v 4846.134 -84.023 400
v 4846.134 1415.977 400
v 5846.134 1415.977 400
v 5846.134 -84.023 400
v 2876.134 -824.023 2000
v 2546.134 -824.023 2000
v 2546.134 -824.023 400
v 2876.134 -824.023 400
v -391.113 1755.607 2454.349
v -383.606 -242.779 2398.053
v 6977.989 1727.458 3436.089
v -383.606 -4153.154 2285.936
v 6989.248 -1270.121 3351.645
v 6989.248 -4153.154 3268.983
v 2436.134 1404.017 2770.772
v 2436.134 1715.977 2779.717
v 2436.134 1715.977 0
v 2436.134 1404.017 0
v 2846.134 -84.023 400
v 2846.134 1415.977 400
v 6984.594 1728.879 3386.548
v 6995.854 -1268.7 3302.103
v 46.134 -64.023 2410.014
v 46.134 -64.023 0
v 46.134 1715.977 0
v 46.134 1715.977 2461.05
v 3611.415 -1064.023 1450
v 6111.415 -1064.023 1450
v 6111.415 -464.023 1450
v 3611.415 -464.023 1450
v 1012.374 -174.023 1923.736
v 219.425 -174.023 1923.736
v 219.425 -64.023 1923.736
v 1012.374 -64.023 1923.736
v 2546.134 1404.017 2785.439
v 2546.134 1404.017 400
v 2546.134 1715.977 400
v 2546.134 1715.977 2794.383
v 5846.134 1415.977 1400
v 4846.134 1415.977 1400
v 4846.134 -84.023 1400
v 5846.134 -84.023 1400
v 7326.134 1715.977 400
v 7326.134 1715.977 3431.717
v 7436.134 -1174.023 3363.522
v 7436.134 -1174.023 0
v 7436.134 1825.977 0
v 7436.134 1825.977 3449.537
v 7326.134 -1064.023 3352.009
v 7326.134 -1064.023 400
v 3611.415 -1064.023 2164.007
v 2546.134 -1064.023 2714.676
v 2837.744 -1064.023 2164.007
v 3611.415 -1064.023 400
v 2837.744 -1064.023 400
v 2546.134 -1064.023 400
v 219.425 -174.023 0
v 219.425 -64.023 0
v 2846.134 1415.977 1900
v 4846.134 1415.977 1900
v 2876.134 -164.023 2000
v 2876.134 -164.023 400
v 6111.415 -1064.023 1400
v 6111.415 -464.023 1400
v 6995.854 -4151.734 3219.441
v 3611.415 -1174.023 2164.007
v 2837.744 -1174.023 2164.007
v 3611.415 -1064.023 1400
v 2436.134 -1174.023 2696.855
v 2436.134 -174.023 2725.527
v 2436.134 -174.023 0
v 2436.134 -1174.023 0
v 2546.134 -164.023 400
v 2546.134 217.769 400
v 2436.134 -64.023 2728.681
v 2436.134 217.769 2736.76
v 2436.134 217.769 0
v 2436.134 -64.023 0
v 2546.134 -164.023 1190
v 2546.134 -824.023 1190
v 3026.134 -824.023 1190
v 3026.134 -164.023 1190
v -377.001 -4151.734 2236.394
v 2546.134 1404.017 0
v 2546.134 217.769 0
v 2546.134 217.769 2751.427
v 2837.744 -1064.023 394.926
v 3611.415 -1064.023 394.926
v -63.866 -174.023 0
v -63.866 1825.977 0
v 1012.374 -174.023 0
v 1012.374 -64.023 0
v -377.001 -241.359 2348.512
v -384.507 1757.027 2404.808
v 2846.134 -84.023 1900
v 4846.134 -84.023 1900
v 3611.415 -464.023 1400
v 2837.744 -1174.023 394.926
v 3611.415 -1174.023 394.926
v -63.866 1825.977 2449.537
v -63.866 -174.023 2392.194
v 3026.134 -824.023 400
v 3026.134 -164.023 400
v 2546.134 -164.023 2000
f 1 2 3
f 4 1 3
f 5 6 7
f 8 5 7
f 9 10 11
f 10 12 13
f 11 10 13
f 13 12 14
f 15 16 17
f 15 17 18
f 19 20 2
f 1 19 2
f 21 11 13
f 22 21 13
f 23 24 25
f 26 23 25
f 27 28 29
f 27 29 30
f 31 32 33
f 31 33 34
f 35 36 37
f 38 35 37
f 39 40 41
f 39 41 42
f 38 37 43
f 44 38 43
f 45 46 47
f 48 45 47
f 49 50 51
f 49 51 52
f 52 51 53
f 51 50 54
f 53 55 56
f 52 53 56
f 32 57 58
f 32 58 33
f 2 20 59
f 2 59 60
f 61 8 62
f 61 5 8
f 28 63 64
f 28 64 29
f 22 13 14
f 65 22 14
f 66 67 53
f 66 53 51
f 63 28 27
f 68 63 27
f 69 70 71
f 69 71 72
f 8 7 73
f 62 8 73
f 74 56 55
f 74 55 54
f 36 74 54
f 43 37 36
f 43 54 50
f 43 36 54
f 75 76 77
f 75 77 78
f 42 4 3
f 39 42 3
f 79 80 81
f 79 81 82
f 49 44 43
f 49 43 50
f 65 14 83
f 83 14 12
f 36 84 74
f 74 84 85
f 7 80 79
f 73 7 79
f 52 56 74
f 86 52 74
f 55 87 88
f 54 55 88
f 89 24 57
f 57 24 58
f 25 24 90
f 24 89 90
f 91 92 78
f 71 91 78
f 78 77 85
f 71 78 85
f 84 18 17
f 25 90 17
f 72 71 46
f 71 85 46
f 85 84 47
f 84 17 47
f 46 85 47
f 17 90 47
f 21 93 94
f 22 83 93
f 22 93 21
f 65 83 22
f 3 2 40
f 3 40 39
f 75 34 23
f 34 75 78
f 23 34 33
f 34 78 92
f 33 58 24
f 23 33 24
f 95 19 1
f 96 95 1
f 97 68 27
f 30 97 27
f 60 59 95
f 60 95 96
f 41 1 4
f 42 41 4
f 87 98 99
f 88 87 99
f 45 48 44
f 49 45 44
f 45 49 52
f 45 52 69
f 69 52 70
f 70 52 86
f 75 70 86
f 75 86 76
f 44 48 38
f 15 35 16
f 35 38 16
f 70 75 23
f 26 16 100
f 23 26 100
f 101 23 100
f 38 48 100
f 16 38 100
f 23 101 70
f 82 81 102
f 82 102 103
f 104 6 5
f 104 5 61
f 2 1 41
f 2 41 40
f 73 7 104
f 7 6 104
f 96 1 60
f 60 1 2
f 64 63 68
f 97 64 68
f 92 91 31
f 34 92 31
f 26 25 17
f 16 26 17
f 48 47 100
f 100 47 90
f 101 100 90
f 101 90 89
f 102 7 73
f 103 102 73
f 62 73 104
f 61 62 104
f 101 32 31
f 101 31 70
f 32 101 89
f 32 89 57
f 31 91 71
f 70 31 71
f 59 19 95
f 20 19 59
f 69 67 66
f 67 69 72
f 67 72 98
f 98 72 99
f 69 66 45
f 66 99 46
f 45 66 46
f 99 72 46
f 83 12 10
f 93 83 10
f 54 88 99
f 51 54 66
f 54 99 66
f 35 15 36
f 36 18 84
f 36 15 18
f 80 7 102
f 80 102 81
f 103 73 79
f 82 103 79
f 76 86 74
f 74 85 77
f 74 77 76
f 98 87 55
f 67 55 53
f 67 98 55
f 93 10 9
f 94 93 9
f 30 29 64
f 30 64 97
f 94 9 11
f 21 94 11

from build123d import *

# Parameters (mm, degrees)
F7_DEPTH  = 50
F8_REACH  = 9267.0421515008
F9_W      = 792.9490208626
F9_H      = 1923.7364530563
F10_DEPTH = 110
F11_W     = 773.6711502075
F11_H     = 1769.0812349319
F12_DEPTH = 110
F13_DEPTH = 400
F14_W     = 660
F14_H     = 790
F15_DEPTH = 480
F14_H_2   = 810
F16_DEPTH = 330
F17_W     = 2000
F17_H     = 1500
F18_DEPTH = 1500
F17_W_2   = 1000
F19_DEPTH = 1000
F20_W     = 2500
F20_H     = 50
F21_DEPTH = 600


# Not quite as in the source:
# - a feature names something its author has since deleted; it is built from what else it names


with BuildPart() as f7:
    # F6 (on 3pt) → F7 (new body)
    with BuildSketch(Plane(origin=(-321.5081857629, -69.1366251757, 2411.3113932214), x_dir=(0.9912350116, -0.0037862856, 0.1320561086), z_dir=(0.1321103773, 0.0284088121, -0.9908278295))):
        Polygon((-62.647297173, 173.9513684009), (-70.2198684375, -1825.2270662935), (2407.8676605606, -1825.2270662935), (7364.0427185569, -1825.2270662935), (7375.4015754536, 1173.5405857481), (7375.4015754536, 4057.758942678), (-62.647297173, 4085.9330937089), align=None)
    extrude(amount=F7_DEPTH)


with BuildPart() as f8:
    f8_end = Plane(origin=(3304.4233440469, -1204.757655027, 2811.745783625), x_dir=(-0.9912279007, 0, -0.1321637201), z_dir=(0.1321103773, 0.0284088121, -0.9908278295))
    # F0 (on Top) → F8 (new body, up to a plane its end follows)
    with BuildSketch(Plane.XY):
        Polygon((7436.1340180039, 1825.9771460295), (2436.1340180039, 1825.9771460295), (2436.1340180039, 1715.9771460295), (2436.1340180039, 1404.0166139603), (2546.1340180039, 1404.0166139603), (2546.1340180039, 1715.9771460295), (7326.1340180039, 1715.9771460295), (7326.1340180039, -1064.0228539705), (2546.1340180039, -1064.0228539705), (2546.1340180039, 217.7686989307), (2436.1340180039, 217.7686989307), (2436.1340180039, -64.0228539705), (2436.1340180039, -174.0228539705), (2436.1340180039, -1174.0228539705), (7436.1340180039, -1174.0228539705), align=None)
        Polygon((2436.1340180039, 1825.9771460295), (-63.8659819961, 1825.9771460295), (-63.8659819961, -174.0228539705), (2436.1340180039, -174.0228539705), (2436.1340180039, -64.0228539705), (46.1340180039, -64.0228539705), (46.1340180039, 1715.9771460295), (2436.1340180039, 1715.9771460295), align=None)
    f8_long = extrude(amount=F8_REACH, mode=Mode.PRIVATE)
    add(split(f8_long, bisect_by=f8_end, keep=Keep.TOP, mode=Mode.PRIVATE))

    # F9 (on face) → F10 (cut, through all)
    with BuildSketch(Plane.XZ.offset(174.0228539705)):
        with Locations((615.8994138241, 961.8682265282)):
            Rectangle(F9_W, F9_H)
    extrude(amount=-F10_DEPTH, mode=Mode.SUBTRACT)

    # F11 (on face) → F12 (cut, through all)
    with BuildSketch(Plane.XZ.offset(1174.0228539705)):
        with Locations((3224.5798110962, 1279.4668078423)):
            Rectangle(F11_W, F11_H)
    extrude(amount=-F12_DEPTH, mode=Mode.SUBTRACT)

    # F0 (on Top) → F13 (join)
    with BuildSketch(Plane.XY):
        Polygon((2546.1340180039, 1715.9771460295), (2546.1340180039, 1404.0166139603), (2546.1340180039, 217.7686989307), (2546.1340180039, -1064.0228539705), (7326.1340180039, -1064.0228539705), (7326.1340180039, 1715.9771460295), align=None)
    extrude(amount=F13_DEPTH)


with BuildPart() as f15:
    # F14 (on face) → F15 (new body)
    with BuildSketch(Plane.YZ.offset(2546.1340180039)):
        with Locations((-494.0228539705, 795)):
            Rectangle(F14_W, F14_H)
    extrude(amount=F15_DEPTH)


with BuildPart() as f16:
    # F14 (on face) → F16 (new body)
    with BuildSketch(Plane.YZ.offset(2546.1340180039)):
        with Locations((-494.0228539705, 795)):
            Rectangle(F14_W, F14_H)
        with Locations((-494.0228539705, 1595)):
            Rectangle(F14_W, F14_H_2)
    extrude(amount=F16_DEPTH)


with BuildPart() as f18:
    # F17 (on face) → F18 (new body)
    with BuildSketch(Plane.XY.offset(400)):
        with Locations((3846.1340180039, 665.9771460295)):
            Rectangle(F17_W, F17_H)
    extrude(amount=F18_DEPTH)


with BuildPart() as f19:
    # F17 (on face) → F19 (new body)
    with BuildSketch(Plane.XY.offset(400)):
        with Locations((5346.1340180039, 665.9771460295)):
            Rectangle(F17_W_2, F17_H)
    extrude(amount=F19_DEPTH)


with BuildPart() as f21:
    # F20 (on face) → F21 (new body)
    with BuildSketch(Plane(origin=(0, -1064.0228539705, 0), x_dir=(-1, 0, 0), z_dir=(0, 1, 0))):
        with Locations((-4861.4153862, 1425)):
            Rectangle(F20_W, F20_H)
    extrude(amount=F21_DEPTH)


solid = Compound([f7.part, f8.part, f15.part, f16.part, f18.part, f19.part, f21.part])
